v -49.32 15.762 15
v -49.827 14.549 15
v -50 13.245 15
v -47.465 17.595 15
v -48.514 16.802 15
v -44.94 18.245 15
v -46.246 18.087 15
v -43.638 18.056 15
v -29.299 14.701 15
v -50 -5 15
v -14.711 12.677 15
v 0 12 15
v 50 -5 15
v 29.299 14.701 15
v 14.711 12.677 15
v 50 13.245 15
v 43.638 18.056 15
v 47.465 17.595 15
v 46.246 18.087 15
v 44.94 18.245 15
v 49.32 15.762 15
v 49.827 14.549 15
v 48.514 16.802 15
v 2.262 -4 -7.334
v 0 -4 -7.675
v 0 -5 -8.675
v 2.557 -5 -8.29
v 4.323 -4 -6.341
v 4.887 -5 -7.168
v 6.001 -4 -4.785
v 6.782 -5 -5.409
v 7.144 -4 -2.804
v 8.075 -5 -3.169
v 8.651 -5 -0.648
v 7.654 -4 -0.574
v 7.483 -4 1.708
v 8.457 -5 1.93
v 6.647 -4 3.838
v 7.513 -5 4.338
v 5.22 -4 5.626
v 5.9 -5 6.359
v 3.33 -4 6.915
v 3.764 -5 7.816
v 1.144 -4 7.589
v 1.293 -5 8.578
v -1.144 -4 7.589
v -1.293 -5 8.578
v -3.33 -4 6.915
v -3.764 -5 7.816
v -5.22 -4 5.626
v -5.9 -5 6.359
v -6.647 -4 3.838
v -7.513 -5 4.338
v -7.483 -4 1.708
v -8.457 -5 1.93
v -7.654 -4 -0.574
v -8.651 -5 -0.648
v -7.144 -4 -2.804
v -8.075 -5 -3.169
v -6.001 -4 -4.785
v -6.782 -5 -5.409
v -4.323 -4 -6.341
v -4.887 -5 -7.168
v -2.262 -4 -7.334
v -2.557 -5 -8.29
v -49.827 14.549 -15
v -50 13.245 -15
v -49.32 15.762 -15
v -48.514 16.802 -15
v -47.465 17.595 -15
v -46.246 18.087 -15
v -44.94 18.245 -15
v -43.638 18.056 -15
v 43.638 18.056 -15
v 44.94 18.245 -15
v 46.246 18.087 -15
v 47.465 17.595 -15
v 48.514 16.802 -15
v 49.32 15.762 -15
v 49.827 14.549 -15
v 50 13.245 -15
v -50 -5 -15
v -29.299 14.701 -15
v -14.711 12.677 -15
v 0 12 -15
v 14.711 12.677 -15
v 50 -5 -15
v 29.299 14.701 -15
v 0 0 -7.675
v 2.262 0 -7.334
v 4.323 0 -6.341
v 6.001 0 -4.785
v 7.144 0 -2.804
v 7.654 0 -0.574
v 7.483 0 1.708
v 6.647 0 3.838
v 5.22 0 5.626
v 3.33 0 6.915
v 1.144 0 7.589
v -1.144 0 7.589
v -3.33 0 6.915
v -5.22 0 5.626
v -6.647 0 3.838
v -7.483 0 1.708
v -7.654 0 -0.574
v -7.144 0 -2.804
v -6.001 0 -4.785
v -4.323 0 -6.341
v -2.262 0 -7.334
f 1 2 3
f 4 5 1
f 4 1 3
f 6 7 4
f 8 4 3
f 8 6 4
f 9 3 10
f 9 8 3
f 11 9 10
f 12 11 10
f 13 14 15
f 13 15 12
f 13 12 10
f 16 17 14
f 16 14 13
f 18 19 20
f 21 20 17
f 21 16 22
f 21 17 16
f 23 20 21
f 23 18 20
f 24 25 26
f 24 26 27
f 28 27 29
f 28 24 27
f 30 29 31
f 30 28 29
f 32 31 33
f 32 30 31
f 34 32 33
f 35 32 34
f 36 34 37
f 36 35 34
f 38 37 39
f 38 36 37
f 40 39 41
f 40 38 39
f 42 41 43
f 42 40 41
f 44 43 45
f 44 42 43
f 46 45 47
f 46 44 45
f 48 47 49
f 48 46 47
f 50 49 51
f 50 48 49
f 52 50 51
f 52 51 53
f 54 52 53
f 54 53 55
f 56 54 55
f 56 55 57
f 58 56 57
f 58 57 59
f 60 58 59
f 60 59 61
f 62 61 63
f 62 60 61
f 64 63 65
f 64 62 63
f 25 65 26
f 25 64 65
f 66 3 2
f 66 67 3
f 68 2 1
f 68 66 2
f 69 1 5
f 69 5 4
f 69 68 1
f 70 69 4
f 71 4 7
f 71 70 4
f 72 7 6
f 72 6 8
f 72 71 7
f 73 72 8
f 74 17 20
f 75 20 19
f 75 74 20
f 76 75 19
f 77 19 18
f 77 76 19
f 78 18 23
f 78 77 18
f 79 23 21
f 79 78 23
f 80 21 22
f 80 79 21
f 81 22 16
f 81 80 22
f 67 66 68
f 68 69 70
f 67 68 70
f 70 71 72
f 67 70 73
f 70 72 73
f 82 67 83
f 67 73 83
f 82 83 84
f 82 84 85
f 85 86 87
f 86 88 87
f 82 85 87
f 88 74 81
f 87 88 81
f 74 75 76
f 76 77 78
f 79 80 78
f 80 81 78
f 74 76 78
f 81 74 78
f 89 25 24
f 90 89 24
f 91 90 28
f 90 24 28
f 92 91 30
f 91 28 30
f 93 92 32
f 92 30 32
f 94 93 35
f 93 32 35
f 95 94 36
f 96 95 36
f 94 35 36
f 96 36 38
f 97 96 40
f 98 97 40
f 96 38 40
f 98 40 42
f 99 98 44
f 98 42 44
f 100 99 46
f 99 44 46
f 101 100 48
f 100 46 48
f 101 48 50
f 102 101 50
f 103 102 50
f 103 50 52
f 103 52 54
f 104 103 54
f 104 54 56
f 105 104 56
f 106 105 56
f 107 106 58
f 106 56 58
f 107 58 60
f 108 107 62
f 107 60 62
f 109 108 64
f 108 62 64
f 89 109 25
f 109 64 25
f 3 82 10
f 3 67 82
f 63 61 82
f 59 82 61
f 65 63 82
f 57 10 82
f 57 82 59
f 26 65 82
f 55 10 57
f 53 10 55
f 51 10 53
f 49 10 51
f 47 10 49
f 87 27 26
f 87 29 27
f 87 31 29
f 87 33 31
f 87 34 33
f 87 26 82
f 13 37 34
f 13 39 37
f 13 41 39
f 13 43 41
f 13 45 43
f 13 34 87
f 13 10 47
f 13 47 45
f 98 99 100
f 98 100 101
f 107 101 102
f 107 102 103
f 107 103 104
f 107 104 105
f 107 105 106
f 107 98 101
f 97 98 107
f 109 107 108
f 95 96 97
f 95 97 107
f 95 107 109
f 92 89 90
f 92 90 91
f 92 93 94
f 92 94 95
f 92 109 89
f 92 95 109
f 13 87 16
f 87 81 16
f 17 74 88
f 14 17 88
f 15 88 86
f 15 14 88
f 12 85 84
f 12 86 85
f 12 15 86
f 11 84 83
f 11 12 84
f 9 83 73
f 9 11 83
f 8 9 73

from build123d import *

# Parameters (mm, degrees)
SKETCH1_W           = 100
SKETCH1_H           = 30
BOSS_EXTRUDE1_DEPTH = 20
CUT_EXTRUDE1_DEPTH  = 62.64414003
FILLET1_R           = 5
SKETCH3_W           = 100
SKETCH3_H           = 30
BOSS_EXTRUDE2_DEPTH = 5
SKETCH4_R           = 7.675
CUT_EXTRUDE2_DEPTH  = 5
CHAMFER1_SIZE       = 1


with BuildPart() as part:
    # Sketch1 → Boss-Extrude1 (new body)
    with BuildSketch(Plane(origin=(0, 0, 0), x_dir=(1, 0, 0), z_dir=(0, 1, 0))):
        Rectangle(SKETCH1_W, SKETCH1_H)
    extrude(amount=BOSS_EXTRUDE1_DEPTH)

    # Sketch2 → Cut-Extrude1 (cut, through all)
    with BuildSketch(Plane.XY.offset(15)):
        with BuildLine():
            Line((-50, 20), (50, 20))
            ThreePointArc((50, 20), (0, 12), (-50, 20))
        make_face()
    extrude(amount=-CUT_EXTRUDE1_DEPTH, mode=Mode.SUBTRACT)

    # Fillet1
    fillet1_edges = [part.edges().sort_by_distance(p)[0] for p in [
        (-50, 20, 0),
        (50, 20, 0),
    ]]
    fillet(fillet1_edges, radius=FILLET1_R)

    # Sketch3 → Boss-Extrude2 (add)
    with BuildSketch(Plane.XZ):
        Rectangle(SKETCH3_W, SKETCH3_H)
    extrude(amount=BOSS_EXTRUDE2_DEPTH)

    # Sketch4 → Cut-Extrude2 (cut)
    with BuildSketch(Plane.XZ.offset(5)):
        with Locations(Location((0, 0, 0), (0, 0, 270))):
            Circle(SKETCH4_R)
    extrude(amount=-CUT_EXTRUDE2_DEPTH, mode=Mode.SUBTRACT)

    # Chamfer1
    chamfer1_edges = [part.edges().sort_by_distance(p)[0] for p in [
        (0, -5, 7.675),
    ]]
    chamfer(chamfer1_edges, length=CHAMFER1_SIZE)


solid = part.part
